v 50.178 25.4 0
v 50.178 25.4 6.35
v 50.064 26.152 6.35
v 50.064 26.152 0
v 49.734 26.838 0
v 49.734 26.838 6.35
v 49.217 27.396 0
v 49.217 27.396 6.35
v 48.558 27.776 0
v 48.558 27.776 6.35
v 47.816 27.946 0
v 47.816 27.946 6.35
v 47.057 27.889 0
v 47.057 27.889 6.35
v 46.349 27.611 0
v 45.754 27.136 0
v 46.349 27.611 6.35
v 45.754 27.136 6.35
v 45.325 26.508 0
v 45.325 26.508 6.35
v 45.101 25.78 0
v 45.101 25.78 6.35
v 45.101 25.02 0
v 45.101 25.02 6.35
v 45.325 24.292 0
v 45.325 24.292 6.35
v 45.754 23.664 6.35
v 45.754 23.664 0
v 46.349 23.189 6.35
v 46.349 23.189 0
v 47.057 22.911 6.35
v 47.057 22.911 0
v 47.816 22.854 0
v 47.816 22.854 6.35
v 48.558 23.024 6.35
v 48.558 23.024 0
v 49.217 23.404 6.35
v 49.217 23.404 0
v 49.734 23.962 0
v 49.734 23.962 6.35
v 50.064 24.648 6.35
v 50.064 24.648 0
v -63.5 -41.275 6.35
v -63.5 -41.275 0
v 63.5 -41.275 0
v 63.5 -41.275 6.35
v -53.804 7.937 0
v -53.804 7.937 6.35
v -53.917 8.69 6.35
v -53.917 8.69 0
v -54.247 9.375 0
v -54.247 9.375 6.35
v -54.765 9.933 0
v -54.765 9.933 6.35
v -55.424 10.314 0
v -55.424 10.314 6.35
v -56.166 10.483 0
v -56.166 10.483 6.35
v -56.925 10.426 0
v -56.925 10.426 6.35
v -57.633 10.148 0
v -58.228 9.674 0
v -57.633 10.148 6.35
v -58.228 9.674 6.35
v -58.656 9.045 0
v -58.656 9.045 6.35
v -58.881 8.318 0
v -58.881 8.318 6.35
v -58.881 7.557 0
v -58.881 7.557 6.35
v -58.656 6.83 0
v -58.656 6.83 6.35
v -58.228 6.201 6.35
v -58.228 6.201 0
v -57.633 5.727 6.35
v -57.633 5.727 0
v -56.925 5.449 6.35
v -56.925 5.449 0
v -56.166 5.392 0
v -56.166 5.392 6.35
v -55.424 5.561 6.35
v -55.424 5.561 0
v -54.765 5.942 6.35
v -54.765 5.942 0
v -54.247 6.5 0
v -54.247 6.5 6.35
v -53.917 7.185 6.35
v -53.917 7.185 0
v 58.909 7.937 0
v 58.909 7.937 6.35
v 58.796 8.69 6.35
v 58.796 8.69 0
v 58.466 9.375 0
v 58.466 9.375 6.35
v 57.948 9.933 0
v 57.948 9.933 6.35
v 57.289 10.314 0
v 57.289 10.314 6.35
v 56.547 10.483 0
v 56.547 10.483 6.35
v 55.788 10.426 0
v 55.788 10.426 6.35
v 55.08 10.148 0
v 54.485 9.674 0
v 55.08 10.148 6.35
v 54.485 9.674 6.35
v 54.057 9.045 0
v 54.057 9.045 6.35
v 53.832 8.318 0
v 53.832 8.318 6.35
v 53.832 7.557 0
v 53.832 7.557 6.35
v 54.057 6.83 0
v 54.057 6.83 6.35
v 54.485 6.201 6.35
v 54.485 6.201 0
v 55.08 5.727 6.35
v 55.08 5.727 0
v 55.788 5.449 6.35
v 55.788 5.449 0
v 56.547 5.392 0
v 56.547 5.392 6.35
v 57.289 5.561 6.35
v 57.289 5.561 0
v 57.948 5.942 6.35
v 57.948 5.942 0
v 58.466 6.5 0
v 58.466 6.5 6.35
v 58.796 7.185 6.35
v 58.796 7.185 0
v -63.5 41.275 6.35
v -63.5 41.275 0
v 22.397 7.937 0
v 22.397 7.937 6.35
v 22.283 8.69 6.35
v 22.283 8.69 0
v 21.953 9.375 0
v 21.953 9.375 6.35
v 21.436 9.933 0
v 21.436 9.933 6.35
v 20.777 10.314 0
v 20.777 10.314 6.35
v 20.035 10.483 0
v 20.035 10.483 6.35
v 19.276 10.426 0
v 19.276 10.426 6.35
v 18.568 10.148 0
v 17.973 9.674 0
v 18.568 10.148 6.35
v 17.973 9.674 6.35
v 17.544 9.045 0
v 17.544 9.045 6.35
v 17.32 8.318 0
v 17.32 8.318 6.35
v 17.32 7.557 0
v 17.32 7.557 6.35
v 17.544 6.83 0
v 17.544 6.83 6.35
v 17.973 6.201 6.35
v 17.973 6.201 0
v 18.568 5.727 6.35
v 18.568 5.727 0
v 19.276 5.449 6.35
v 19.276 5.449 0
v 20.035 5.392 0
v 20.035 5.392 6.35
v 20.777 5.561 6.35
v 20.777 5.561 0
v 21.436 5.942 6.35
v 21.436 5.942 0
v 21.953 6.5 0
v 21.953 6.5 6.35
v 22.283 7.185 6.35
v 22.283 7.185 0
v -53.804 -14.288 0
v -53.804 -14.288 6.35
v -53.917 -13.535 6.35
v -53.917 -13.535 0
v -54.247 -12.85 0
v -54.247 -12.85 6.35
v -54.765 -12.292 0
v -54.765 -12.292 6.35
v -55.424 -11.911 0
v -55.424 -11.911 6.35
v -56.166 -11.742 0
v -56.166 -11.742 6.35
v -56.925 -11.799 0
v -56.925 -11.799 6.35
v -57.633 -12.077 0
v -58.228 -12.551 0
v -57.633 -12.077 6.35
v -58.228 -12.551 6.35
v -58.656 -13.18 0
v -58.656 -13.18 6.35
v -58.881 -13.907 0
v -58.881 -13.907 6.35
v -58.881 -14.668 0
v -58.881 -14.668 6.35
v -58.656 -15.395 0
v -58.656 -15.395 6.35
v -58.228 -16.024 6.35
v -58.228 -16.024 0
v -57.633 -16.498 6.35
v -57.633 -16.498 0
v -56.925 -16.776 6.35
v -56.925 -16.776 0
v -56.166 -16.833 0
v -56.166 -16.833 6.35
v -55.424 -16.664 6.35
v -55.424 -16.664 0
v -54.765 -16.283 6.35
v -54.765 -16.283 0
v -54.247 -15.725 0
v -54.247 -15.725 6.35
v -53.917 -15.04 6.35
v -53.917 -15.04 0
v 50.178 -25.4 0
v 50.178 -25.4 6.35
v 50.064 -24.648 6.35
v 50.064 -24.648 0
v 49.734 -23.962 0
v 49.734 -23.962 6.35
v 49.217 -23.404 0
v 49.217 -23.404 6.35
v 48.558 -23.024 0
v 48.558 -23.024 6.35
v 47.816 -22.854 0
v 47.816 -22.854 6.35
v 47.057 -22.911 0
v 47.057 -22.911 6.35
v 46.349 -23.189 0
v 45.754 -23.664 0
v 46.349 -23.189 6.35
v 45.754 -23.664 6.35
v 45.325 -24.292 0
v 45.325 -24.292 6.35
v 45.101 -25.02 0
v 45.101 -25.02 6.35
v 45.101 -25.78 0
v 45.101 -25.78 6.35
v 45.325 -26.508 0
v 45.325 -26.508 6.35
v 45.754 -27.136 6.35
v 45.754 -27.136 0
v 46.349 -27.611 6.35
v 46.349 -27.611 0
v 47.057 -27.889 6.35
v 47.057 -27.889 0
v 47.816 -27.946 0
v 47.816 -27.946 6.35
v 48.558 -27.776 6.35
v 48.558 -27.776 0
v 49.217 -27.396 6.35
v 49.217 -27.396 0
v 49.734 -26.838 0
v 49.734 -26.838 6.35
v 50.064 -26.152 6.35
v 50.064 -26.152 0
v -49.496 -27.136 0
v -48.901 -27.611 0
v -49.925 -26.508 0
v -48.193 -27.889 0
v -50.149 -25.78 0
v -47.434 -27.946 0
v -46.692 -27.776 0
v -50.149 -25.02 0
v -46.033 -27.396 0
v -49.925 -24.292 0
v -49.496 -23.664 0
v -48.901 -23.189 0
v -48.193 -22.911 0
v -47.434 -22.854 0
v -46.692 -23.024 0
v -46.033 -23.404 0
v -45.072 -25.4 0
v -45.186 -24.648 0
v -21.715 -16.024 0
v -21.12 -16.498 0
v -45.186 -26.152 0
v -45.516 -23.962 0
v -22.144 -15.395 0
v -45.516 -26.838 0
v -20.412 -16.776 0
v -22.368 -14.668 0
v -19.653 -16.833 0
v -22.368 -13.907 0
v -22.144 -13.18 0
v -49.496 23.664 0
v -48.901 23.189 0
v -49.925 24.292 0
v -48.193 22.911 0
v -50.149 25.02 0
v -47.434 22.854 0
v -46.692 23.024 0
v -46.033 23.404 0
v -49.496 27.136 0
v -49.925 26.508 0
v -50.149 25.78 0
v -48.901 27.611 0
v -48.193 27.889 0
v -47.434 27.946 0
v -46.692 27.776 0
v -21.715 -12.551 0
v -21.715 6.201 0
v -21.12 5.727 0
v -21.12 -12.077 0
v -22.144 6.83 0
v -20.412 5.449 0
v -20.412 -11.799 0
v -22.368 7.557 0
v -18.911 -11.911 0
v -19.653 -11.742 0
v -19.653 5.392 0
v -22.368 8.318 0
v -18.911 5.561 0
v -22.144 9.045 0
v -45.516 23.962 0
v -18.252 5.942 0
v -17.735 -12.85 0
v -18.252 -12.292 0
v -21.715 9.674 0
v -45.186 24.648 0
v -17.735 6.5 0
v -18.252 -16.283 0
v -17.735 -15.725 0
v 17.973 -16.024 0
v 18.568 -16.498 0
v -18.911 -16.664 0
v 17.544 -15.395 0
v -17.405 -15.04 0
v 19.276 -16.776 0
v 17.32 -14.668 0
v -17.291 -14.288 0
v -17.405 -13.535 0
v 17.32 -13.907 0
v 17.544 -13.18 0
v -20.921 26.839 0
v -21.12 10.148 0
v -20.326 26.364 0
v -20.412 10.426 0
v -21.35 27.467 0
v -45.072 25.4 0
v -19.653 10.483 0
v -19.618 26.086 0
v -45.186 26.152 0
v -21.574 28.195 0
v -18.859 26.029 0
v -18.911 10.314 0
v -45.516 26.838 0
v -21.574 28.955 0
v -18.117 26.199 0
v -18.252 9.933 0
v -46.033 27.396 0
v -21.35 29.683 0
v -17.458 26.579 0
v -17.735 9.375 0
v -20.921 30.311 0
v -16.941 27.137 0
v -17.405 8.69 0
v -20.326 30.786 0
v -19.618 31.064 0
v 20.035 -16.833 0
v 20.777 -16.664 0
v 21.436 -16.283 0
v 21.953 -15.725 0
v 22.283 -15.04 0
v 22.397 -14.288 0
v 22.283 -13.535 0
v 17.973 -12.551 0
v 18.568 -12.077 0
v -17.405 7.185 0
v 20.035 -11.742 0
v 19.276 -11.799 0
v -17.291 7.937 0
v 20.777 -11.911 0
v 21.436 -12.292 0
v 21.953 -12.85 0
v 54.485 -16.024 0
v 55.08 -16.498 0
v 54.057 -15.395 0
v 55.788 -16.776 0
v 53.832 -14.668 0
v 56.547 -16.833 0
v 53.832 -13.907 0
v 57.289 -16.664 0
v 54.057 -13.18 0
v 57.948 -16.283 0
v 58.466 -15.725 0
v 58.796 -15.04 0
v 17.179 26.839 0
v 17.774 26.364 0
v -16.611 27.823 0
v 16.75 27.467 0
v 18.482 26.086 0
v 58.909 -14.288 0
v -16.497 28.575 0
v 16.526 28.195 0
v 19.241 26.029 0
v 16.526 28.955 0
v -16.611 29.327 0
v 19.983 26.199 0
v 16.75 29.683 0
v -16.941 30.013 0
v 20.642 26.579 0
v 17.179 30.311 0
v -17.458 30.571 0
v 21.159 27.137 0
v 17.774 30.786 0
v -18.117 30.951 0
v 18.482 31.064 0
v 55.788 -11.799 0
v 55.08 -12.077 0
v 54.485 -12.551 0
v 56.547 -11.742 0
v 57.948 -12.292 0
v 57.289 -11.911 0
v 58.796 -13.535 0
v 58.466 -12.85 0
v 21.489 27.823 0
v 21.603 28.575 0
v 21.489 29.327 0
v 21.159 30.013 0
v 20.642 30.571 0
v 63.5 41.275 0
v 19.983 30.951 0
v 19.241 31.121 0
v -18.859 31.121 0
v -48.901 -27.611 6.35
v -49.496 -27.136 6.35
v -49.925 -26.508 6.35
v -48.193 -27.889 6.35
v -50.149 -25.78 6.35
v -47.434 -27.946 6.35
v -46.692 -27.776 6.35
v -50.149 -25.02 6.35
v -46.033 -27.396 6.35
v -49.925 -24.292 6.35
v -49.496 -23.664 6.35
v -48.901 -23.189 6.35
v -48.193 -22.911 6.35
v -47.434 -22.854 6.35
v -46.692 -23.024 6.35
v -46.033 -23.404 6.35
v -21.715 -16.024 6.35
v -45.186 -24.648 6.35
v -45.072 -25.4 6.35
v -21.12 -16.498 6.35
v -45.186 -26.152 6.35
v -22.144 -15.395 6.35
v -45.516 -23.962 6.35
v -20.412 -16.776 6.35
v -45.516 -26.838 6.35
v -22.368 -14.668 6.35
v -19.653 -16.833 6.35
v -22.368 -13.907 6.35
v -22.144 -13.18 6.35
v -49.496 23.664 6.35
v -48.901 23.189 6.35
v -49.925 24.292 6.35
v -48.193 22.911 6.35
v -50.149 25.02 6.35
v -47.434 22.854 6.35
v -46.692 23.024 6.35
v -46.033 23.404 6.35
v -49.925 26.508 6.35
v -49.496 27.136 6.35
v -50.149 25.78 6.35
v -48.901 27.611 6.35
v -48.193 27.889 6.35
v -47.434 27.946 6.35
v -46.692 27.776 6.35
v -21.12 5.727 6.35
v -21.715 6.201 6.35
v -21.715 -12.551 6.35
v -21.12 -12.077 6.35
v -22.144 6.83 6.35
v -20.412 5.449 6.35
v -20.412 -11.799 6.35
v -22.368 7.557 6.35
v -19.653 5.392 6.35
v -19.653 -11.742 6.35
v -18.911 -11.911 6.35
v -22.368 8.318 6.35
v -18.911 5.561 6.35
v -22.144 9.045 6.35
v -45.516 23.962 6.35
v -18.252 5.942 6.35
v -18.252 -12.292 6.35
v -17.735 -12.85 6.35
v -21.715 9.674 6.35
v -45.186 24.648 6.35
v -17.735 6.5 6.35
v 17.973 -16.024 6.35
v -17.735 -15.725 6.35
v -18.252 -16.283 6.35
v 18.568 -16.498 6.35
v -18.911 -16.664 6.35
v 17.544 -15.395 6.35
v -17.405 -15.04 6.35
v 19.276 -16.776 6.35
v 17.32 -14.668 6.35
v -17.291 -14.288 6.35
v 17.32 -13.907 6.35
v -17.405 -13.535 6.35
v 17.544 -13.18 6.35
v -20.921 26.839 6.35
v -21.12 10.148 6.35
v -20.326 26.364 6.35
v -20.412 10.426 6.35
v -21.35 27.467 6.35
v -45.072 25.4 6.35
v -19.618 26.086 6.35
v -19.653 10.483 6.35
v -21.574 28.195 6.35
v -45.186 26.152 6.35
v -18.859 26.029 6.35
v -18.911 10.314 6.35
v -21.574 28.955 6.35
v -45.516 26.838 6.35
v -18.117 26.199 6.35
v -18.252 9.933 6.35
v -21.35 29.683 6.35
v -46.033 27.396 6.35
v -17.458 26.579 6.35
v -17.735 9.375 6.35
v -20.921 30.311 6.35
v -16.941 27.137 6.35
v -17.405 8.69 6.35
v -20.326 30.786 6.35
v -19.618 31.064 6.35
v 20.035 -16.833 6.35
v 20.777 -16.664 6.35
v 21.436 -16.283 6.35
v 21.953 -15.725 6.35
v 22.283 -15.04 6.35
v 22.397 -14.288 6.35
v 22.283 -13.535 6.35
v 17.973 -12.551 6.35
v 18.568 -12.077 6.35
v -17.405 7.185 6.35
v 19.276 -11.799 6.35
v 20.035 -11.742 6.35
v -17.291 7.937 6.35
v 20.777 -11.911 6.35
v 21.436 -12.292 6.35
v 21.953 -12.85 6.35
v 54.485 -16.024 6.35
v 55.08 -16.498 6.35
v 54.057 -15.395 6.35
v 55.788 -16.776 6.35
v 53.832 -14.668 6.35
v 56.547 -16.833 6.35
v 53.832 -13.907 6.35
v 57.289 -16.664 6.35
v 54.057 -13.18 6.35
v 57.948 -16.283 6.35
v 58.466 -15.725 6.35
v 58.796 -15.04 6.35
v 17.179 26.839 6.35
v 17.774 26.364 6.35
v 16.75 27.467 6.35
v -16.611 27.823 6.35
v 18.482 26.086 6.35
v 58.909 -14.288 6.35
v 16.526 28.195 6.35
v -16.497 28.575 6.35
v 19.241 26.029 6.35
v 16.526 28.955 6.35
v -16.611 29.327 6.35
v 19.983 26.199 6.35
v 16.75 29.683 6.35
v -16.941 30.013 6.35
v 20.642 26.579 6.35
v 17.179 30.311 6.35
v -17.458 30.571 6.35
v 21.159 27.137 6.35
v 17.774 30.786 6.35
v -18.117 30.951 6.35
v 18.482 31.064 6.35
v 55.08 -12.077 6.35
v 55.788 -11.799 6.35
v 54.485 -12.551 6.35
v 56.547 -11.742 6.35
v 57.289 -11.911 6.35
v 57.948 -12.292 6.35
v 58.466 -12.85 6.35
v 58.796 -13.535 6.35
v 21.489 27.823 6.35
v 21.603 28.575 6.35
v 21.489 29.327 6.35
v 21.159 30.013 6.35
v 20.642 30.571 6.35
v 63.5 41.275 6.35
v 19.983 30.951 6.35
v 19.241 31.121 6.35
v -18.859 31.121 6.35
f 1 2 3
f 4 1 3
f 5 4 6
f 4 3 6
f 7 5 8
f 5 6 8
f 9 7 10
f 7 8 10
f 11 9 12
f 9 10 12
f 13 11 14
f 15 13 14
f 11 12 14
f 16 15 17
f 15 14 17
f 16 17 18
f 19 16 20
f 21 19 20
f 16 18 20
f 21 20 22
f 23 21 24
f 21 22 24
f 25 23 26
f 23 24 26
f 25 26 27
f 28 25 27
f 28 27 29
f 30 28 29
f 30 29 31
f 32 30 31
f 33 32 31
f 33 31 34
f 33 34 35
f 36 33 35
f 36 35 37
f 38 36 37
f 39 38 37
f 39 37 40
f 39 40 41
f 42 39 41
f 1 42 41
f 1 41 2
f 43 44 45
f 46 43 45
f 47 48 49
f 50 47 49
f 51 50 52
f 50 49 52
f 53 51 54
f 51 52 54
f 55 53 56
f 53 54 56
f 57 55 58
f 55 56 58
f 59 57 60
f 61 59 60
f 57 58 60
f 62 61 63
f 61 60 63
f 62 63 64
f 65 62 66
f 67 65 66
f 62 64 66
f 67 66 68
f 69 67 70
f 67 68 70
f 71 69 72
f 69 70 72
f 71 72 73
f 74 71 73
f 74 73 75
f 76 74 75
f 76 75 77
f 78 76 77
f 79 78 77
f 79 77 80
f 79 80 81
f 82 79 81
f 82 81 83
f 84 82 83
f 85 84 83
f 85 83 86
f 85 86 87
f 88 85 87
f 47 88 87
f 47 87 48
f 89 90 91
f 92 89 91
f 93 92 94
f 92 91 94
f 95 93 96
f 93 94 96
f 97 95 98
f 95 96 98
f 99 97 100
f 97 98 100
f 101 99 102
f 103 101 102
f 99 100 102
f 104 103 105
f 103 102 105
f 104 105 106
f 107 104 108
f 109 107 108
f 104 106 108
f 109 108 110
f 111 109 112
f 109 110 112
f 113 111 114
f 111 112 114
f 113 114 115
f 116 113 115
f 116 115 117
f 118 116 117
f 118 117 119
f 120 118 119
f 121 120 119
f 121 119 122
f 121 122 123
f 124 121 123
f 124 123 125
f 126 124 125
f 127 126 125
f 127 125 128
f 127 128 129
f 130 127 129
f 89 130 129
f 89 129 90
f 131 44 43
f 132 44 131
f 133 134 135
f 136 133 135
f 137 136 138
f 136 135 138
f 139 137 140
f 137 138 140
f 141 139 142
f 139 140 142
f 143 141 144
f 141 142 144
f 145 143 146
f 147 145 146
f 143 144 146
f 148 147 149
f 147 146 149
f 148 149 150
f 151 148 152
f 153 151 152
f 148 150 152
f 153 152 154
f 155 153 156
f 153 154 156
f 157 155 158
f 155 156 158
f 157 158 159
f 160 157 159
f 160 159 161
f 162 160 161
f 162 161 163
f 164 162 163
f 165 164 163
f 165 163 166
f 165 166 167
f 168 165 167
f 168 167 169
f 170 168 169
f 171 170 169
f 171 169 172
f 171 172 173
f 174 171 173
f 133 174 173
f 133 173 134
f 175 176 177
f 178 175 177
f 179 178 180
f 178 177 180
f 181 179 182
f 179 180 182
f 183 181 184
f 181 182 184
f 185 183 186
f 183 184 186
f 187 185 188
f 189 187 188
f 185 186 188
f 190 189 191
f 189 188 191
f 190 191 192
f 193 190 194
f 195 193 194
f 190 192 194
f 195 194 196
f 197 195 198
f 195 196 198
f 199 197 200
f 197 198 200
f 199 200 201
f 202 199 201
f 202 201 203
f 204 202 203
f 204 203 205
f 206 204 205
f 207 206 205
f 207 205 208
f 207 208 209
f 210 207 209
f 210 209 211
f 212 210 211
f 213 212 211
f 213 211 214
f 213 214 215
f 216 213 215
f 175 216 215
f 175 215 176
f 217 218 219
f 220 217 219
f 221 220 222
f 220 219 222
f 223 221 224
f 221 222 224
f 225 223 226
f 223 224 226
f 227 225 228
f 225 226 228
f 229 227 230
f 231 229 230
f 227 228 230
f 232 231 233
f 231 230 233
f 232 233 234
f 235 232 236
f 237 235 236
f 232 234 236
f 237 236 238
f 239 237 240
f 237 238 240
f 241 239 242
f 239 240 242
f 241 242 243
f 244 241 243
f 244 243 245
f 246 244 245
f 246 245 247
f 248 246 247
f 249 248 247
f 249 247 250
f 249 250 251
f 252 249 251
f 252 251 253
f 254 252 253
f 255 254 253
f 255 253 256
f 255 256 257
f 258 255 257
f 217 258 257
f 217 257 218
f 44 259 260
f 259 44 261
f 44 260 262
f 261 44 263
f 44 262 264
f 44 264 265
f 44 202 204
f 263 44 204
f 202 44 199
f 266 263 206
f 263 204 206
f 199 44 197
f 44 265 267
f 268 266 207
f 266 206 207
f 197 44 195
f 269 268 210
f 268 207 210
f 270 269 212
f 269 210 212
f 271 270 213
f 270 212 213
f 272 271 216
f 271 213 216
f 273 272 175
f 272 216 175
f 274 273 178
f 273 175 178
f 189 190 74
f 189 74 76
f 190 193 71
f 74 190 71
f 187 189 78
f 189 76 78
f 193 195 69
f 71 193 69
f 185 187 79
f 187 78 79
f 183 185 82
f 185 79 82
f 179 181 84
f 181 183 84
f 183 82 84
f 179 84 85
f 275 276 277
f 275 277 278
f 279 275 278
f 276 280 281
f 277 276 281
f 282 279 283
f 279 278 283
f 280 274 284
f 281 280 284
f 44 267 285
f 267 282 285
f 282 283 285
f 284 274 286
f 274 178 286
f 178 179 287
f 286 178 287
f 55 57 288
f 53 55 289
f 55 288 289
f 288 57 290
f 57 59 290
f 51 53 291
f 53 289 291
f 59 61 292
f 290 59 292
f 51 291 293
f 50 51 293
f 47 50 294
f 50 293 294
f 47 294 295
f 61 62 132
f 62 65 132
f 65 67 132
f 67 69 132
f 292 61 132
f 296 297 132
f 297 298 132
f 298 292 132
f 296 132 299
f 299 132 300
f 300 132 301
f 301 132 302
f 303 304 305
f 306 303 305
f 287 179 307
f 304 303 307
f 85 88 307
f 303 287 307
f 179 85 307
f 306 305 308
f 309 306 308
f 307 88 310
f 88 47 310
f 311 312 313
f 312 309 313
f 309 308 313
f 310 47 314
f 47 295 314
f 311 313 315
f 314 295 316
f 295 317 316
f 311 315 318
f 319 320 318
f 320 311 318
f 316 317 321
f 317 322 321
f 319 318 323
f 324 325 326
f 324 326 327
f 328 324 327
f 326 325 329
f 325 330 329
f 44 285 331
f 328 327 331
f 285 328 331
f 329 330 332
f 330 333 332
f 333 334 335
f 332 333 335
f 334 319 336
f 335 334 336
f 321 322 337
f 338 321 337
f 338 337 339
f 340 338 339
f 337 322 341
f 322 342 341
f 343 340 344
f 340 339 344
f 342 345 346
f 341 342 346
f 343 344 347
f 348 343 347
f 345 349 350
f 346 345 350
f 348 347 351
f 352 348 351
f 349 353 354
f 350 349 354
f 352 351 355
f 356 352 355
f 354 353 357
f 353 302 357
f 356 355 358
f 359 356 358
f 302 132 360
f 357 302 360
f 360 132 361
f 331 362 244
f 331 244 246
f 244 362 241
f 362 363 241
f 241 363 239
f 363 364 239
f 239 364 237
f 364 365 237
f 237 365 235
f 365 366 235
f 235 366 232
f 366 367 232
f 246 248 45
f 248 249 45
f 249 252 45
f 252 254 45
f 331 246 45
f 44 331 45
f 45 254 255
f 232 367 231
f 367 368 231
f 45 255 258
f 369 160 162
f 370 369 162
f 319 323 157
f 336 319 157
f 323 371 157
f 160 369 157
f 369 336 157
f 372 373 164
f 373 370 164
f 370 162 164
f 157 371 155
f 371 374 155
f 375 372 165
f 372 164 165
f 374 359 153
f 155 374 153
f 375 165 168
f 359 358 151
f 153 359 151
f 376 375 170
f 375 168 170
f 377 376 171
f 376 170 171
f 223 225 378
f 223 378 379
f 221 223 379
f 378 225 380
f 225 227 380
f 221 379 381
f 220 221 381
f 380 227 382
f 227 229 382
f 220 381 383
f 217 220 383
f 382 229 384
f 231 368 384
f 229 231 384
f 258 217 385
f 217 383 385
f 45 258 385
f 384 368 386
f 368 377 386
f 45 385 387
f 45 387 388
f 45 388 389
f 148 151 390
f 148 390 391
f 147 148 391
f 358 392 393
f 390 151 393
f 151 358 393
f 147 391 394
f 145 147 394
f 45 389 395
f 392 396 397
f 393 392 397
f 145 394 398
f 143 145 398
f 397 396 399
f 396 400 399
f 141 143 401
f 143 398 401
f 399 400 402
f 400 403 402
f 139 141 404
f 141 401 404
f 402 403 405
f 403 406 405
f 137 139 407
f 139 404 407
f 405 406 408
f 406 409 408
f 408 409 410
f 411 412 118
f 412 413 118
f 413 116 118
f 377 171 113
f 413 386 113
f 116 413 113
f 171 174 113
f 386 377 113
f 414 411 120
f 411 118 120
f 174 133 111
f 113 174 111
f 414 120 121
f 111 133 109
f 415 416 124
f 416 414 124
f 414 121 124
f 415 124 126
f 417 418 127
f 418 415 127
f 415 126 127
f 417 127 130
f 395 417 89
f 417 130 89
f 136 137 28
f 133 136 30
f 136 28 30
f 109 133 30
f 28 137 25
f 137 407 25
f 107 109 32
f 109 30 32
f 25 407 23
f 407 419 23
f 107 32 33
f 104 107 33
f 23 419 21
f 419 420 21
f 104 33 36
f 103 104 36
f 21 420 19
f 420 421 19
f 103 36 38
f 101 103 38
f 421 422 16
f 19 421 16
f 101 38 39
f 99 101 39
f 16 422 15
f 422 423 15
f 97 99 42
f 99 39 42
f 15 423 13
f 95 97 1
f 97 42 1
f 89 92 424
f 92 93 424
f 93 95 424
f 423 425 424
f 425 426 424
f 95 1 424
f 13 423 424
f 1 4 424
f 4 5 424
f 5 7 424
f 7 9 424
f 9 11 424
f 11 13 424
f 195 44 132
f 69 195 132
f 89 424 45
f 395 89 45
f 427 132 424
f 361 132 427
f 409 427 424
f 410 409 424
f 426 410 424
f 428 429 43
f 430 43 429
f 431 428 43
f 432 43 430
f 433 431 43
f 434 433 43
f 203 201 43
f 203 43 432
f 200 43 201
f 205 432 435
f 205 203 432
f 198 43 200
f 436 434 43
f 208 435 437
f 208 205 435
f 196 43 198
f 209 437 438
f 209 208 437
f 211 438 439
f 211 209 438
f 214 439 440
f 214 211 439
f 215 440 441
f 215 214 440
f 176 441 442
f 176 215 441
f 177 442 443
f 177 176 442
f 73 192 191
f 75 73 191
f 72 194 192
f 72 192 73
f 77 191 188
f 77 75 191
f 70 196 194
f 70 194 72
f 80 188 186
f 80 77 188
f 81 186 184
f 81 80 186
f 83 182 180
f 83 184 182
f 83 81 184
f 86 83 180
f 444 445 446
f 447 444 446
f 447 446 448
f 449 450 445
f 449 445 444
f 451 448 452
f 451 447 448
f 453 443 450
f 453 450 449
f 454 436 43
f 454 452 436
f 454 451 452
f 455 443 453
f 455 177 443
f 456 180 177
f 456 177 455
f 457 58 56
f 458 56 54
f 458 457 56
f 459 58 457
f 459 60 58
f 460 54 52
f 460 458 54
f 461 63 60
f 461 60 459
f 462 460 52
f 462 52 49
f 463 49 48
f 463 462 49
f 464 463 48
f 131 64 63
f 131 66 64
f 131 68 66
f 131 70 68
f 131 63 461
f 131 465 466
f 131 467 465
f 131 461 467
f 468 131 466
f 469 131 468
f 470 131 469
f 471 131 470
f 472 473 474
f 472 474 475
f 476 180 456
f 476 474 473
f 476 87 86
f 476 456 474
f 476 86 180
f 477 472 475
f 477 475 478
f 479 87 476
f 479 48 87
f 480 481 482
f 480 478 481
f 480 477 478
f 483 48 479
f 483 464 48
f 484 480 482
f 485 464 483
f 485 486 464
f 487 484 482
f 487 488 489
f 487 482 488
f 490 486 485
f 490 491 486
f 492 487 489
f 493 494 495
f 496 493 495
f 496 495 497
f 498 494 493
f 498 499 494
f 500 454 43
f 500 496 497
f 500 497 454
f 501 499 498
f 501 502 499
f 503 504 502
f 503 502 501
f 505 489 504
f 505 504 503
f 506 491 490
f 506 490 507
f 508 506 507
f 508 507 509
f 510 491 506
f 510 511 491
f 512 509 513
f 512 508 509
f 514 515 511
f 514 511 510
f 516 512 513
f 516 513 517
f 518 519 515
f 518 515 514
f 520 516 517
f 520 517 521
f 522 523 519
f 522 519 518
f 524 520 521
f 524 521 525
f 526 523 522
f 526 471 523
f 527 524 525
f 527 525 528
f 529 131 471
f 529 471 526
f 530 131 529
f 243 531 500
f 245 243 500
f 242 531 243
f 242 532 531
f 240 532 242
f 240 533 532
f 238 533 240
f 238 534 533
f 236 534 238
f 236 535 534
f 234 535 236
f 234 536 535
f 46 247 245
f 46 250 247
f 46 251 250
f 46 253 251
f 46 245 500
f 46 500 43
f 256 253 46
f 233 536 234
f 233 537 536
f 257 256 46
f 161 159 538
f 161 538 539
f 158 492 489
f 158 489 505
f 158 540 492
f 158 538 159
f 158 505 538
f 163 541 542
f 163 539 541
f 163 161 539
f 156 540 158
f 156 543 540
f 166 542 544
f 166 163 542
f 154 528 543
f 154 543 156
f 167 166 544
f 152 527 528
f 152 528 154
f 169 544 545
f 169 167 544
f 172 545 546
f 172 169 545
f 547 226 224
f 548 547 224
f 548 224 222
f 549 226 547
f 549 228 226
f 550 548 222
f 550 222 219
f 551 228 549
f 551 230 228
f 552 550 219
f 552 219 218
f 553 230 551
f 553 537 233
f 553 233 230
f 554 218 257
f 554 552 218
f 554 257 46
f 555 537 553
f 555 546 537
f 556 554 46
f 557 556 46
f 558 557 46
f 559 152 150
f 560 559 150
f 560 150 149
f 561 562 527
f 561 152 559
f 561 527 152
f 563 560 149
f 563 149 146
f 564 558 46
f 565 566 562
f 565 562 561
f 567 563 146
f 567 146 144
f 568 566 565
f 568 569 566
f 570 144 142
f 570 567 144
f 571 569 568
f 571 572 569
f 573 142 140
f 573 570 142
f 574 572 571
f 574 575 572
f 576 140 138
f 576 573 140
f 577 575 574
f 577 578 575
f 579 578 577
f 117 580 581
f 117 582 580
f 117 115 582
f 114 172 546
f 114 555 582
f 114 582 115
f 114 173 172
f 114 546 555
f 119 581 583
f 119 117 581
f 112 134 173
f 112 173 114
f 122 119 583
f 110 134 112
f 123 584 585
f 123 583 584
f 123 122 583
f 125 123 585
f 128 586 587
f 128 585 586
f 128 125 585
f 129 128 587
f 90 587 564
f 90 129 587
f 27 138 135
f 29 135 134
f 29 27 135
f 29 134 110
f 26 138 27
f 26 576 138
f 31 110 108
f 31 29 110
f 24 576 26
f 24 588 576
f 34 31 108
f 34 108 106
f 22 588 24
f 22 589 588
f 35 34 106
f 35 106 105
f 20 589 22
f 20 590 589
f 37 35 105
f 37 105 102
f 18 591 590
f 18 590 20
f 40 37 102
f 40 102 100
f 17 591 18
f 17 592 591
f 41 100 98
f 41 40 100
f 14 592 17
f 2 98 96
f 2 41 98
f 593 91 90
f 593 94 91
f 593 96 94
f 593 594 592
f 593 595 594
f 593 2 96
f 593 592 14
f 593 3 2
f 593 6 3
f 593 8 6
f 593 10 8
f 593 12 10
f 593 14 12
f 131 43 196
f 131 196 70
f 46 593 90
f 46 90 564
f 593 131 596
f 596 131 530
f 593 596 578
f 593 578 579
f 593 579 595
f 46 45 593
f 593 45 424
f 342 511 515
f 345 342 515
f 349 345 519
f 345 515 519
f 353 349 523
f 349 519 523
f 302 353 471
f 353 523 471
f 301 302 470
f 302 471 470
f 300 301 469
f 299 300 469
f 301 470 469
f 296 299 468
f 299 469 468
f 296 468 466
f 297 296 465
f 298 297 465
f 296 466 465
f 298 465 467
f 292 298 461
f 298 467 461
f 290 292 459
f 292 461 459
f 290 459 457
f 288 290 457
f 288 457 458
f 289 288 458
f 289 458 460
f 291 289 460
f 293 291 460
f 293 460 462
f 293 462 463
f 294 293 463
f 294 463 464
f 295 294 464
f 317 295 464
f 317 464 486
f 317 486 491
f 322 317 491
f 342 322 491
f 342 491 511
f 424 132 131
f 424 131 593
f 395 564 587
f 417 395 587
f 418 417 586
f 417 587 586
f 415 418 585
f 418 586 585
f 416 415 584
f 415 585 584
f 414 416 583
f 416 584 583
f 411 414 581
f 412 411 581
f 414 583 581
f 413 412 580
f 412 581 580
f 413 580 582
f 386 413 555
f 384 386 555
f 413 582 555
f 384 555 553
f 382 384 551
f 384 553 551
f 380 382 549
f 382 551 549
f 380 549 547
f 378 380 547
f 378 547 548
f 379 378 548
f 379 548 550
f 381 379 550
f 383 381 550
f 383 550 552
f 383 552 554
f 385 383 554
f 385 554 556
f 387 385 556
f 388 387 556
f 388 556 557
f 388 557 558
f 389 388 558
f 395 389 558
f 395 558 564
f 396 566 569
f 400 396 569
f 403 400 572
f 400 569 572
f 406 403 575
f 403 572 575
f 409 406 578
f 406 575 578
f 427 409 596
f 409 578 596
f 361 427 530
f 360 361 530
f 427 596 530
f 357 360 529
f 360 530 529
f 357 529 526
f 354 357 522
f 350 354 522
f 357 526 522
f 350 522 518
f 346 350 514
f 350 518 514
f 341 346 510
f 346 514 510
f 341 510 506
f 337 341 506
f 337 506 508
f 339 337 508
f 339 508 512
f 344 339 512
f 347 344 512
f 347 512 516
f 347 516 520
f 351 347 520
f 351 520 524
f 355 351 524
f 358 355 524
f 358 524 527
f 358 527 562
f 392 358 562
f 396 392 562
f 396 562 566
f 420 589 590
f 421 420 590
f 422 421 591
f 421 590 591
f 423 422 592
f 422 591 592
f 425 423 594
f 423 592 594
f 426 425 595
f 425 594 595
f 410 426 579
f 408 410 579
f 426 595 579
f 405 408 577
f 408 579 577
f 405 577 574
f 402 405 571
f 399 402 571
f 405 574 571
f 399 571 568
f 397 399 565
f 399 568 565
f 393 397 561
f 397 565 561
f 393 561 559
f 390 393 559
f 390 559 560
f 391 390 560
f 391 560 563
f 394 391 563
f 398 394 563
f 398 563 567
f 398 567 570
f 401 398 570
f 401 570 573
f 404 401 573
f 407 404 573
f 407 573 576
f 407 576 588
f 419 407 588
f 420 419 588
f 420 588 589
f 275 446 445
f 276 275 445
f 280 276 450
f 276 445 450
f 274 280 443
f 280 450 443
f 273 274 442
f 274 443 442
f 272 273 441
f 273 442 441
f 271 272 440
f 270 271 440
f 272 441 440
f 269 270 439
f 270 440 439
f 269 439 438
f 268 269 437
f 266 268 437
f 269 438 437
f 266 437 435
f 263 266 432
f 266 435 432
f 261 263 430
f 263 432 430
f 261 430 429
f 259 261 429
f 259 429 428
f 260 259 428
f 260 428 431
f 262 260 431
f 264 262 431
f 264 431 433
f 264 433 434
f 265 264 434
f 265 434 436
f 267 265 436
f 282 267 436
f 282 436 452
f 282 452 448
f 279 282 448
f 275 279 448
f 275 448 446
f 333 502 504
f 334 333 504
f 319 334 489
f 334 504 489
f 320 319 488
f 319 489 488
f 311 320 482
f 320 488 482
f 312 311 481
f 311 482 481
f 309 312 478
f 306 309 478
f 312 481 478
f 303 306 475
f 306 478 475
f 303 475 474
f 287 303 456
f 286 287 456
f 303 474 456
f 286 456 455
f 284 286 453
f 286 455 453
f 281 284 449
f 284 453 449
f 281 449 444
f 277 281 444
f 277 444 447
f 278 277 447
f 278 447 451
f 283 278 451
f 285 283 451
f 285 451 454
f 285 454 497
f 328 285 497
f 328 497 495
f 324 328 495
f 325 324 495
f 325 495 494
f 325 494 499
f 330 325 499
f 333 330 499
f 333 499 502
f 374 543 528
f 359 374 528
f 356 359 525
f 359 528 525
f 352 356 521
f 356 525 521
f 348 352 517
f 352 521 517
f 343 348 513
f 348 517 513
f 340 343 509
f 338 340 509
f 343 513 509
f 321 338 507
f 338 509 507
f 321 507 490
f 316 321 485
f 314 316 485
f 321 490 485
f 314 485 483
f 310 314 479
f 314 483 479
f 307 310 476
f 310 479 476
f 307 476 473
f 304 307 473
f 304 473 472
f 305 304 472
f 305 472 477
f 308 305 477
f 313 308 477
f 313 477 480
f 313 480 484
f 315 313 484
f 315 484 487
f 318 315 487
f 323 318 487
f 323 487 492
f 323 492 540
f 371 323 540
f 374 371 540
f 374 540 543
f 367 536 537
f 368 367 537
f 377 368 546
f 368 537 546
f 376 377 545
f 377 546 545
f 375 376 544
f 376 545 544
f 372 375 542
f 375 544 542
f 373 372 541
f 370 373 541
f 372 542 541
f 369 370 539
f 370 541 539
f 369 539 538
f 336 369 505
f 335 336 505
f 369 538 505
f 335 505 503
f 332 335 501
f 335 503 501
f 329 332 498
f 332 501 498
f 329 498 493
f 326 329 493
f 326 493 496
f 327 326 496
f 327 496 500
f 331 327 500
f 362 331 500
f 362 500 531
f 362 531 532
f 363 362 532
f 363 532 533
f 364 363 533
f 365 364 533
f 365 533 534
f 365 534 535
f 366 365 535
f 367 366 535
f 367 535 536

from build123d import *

# Parameters (mm, degrees)
SKETCH1_W                     = 127
SKETCH1_H                     = 82.55
PLATE_DEPTH                   = 6.35
BEARING_NUT_HELICOIL_HOLES_D  = 5.1054
ROUTER_MOUNT_HELICOIL_HOLES_D = 5.1054


with BuildPart() as part:
    # Sketch1 → Plate (new body)
    with BuildSketch(Plane.XY):
        Rectangle(SKETCH1_W, SKETCH1_H)
    extrude(amount=PLATE_DEPTH)

    # Bearing/Nut Helicoil Holes (through all)
    with Locations(Plane(origin=(0, 0, 0), x_dir=(-1, 0, 0), z_dir=(0, 0, -1))):
        with Locations((-56.3565, 7.9375), (-19.844, -14.2875), (-56.3565, -14.2875), (-19.844, 7.9375), (19.844, 7.9375), (56.3565, -14.2875), (19.844, -14.2875), (56.3565, 7.9375), (-19.05, 28.575), (19.05, 28.575)):
            Hole(BEARING_NUT_HELICOIL_HOLES_D / 2)

    # Router Mount Helicoil Holes (through all)
    with Locations(Plane(origin=(0, 0, 0), x_dir=(-1, 0, 0), z_dir=(0, 0, -1))):
        with Locations((-47.625, 25.4), (47.625, -25.4), (-47.625, -25.4), (47.625, 25.4)):
            Hole(ROUTER_MOUNT_HELICOIL_HOLES_D / 2)


solid = part.part
